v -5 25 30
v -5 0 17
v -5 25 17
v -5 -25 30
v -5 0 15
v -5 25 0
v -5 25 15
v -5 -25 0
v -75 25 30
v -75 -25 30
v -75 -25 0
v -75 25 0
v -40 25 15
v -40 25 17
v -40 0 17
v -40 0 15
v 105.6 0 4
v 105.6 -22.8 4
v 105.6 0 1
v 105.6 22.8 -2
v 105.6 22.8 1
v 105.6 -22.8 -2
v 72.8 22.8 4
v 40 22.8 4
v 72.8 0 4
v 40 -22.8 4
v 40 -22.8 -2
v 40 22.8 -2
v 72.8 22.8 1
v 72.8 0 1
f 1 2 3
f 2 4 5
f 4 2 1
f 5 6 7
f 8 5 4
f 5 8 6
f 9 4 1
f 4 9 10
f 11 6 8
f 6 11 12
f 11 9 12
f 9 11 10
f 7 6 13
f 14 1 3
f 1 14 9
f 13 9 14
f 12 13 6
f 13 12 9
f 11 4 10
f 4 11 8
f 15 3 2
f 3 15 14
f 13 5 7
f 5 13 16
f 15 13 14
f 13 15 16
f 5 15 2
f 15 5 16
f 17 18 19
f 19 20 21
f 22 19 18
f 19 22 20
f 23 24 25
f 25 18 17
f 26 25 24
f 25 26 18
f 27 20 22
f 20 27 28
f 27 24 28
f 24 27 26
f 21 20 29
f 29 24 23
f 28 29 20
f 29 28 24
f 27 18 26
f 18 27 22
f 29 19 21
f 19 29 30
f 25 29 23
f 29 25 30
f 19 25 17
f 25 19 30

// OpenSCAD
// Two-part enclosure for small electronics board
// Part 1: Box (left)
// Part 2: Lid (right, printed upside down)
// Prints together with a 10 mm gap between them.

// --- Dimensions ---
// Box Outer Dimensions (X x Y x Z)
$box_outer_x = 70;
$box_outer_y = 50;
$box_outer_z = 30;

// Wall and Floor Thickness
$wall_thickness = 2;
$floor_thickness = 2;

// Lid Dimensions
// Plate thickness
$plate_thickness = 2;
// Lip dimensions
$lip_thickness = 1.5;
$lip_height = 4;
// Lip outer size (fits inside box opening)
$lip_outer_x = 65.6;
$lip_outer_y = 45.6;

// Clearance
// Box Inner X = 70 - 2*2 = 66
// Box Inner Y = 50 - 2 (floor) - 2 (side) = 46
// Lip Outer X = 65.6 -> Clearance = (66 - 65.6) / 2 = 0.2 mm per side
// Lip Outer Y = 45.6 -> Clearance = (46 - 45.6) / 2 = 0.2 mm per side

// Gap between parts
$gap = 10;

// --- Quality Settings ---
$fn = 64;

// --- Part 1: The Box ---
// Position: Centered on origin in X/Y relative to its own block, then shifted left.
// Box center X = -($gap/2 + $box_outer_x/2)
// Box center Y = 0
// Box center Z = $box_outer_z / 2

$box_x_pos = -($gap/2 + $box_outer_x/2);
$box_y_pos = 0;
$box_z_pos = $box_outer_z / 2;

translate([$box_x_pos, $box_y_pos, $box_z_pos])
difference() {
    // Outer Block
    cube([
        $box_outer_x, 
        $box_outer_y, 
        $box_outer_z
    ], center = true);
    
    // Cut Floor (Open Top)
    // Floor is at bottom (Z=0 relative to box). Thickness = $floor_thickness.
    // Cut from Z=0 to Z=$floor_thickness.
    translate([0, 0, 0])
    cube([
        $box_outer_x, 
        $box_outer_y, 
        $floor_thickness
    ], center = false);
    
    // Cut Side Walls (Open Top)
    // We need to cut the top face of the side walls to create the opening.
    // The opening is at the top of the box.
    // Side walls are at X = +/- $wall_thickness and Y = +/- $wall_thickness.
    // We cut a rectangle at the top surface.
    
    // Cut Left Wall Top
    translate([-($box_outer_x/2) + $wall_thickness, 0, $box_outer_z - $wall_thickness])
    cube([
        $box_outer_x - 2*$wall_thickness, 
        $wall_thickness + 0.01, // Extend slightly past wall top
        $wall_thickness + 0.01
    ], center = false);
    
    // Cut Right Wall Top
    translate([-($box_outer_x/2) - $wall_thickness, 0, $box_outer_z - $wall_thickness])
    cube([
        $box_outer_x - 2*$wall_thickness, 
        $wall_thickness + 0.01,
        $wall_thickness + 0.01
    ], center = false);
    
    // Cut Front Wall Top
    translate([0, -($box_outer_y/2) + $wall_thickness, $box_outer_z - $wall_thickness])
    cube([
        $wall_thickness + 0.01,
        $box_outer_y - 2*$wall_thickness,
        $wall_thickness + 0.01
    ], center = false);
    
    // Cut Back Wall Top
    translate([0, -($box_outer_y/2) - $wall_thickness, $box_outer_z - $wall_thickness])
    cube([
        $wall_thickness + 0.01,
        $box_outer_y - 2*$wall_thickness,
        $wall_thickness + 0.01
    ], center = false);
}

// --- Part 2: The Lid ---
// Position: To the right of the box.
// Lid center X = $gap/2 + $box_outer_x/2 + $lip_outer_x/2
// Lid center Y = 0
// Lid center Z = $plate_thickness / 2 (Since it prints upside down, the plate is on the bed, lip is up)

$lip_x_pos = $gap/2 + $box_outer_x/2 + $lip_outer_x/2;
$lip_y_pos = 0;
$lip_z_pos = $plate_thickness / 2;

translate([$lip_x_pos, $lip_y_pos, $lip_z_pos])
difference() {
    // Outer Block (Plate + Lip)
    // Total Height = Plate Thickness + Lip Height
    // Total Width = Lip Outer X
    // Total Depth = Lip Outer Y
    cube([
        $lip_outer_x, 
        $lip_outer_y, 
        $plate_thickness + $lip_height
    ], center = true);
    
    // Cut the hole for the lip to slide into the box
    // The hole is in the plate section (bottom part).
    // The lip sits on top of the plate.
    // The hole needs to be slightly larger than the lip inner dimensions to allow sliding.
    // Lip Outer X = 65.6. Lip Outer Y = 45.6.
    // Clearance = 0.2 mm per side.
    // Hole Inner X = 65.6 + 0.4 = 66.0
    // Hole Inner Y = 45.6 + 0.4 = 46.0
    
    $hole_x = $lip_outer_x + 0.4;
    $hole_y = $lip_outer_y + 0.4;
    
    // Position the hole at the bottom of the block (the plate)
    // Block bottom Z = 0. Block top Z = $plate_thickness + $lip_height.
    // Plate is from Z=0 to Z=$plate_thickness.
    // Hole is centered in X/Y, located at bottom Z.
    
    translate([0, 0, 0])
    cube([
        $hole_x, 
        $hole_y, 
        $plate_thickness + 0.01 // Extend slightly past plate top to ensure clean cut
    ], center = false);
    
    // Cut the Lip itself (the part sticking up)
    // The lip is the top part of the block.
    // Lip Outer X = 65.6, Lip Outer Y = 45.6, Lip Height = 4.
    // Lip is centered on the block.
    // Lip bottom Z = $plate_thickness. Lip top Z = $plate_thickness + $lip_height.
    
    translate([0, 0, $plate_thickness])
    cube([
        $lip_outer_x, 
        $lip_outer_y, 
        $lip_height
    ], center = false);
}
